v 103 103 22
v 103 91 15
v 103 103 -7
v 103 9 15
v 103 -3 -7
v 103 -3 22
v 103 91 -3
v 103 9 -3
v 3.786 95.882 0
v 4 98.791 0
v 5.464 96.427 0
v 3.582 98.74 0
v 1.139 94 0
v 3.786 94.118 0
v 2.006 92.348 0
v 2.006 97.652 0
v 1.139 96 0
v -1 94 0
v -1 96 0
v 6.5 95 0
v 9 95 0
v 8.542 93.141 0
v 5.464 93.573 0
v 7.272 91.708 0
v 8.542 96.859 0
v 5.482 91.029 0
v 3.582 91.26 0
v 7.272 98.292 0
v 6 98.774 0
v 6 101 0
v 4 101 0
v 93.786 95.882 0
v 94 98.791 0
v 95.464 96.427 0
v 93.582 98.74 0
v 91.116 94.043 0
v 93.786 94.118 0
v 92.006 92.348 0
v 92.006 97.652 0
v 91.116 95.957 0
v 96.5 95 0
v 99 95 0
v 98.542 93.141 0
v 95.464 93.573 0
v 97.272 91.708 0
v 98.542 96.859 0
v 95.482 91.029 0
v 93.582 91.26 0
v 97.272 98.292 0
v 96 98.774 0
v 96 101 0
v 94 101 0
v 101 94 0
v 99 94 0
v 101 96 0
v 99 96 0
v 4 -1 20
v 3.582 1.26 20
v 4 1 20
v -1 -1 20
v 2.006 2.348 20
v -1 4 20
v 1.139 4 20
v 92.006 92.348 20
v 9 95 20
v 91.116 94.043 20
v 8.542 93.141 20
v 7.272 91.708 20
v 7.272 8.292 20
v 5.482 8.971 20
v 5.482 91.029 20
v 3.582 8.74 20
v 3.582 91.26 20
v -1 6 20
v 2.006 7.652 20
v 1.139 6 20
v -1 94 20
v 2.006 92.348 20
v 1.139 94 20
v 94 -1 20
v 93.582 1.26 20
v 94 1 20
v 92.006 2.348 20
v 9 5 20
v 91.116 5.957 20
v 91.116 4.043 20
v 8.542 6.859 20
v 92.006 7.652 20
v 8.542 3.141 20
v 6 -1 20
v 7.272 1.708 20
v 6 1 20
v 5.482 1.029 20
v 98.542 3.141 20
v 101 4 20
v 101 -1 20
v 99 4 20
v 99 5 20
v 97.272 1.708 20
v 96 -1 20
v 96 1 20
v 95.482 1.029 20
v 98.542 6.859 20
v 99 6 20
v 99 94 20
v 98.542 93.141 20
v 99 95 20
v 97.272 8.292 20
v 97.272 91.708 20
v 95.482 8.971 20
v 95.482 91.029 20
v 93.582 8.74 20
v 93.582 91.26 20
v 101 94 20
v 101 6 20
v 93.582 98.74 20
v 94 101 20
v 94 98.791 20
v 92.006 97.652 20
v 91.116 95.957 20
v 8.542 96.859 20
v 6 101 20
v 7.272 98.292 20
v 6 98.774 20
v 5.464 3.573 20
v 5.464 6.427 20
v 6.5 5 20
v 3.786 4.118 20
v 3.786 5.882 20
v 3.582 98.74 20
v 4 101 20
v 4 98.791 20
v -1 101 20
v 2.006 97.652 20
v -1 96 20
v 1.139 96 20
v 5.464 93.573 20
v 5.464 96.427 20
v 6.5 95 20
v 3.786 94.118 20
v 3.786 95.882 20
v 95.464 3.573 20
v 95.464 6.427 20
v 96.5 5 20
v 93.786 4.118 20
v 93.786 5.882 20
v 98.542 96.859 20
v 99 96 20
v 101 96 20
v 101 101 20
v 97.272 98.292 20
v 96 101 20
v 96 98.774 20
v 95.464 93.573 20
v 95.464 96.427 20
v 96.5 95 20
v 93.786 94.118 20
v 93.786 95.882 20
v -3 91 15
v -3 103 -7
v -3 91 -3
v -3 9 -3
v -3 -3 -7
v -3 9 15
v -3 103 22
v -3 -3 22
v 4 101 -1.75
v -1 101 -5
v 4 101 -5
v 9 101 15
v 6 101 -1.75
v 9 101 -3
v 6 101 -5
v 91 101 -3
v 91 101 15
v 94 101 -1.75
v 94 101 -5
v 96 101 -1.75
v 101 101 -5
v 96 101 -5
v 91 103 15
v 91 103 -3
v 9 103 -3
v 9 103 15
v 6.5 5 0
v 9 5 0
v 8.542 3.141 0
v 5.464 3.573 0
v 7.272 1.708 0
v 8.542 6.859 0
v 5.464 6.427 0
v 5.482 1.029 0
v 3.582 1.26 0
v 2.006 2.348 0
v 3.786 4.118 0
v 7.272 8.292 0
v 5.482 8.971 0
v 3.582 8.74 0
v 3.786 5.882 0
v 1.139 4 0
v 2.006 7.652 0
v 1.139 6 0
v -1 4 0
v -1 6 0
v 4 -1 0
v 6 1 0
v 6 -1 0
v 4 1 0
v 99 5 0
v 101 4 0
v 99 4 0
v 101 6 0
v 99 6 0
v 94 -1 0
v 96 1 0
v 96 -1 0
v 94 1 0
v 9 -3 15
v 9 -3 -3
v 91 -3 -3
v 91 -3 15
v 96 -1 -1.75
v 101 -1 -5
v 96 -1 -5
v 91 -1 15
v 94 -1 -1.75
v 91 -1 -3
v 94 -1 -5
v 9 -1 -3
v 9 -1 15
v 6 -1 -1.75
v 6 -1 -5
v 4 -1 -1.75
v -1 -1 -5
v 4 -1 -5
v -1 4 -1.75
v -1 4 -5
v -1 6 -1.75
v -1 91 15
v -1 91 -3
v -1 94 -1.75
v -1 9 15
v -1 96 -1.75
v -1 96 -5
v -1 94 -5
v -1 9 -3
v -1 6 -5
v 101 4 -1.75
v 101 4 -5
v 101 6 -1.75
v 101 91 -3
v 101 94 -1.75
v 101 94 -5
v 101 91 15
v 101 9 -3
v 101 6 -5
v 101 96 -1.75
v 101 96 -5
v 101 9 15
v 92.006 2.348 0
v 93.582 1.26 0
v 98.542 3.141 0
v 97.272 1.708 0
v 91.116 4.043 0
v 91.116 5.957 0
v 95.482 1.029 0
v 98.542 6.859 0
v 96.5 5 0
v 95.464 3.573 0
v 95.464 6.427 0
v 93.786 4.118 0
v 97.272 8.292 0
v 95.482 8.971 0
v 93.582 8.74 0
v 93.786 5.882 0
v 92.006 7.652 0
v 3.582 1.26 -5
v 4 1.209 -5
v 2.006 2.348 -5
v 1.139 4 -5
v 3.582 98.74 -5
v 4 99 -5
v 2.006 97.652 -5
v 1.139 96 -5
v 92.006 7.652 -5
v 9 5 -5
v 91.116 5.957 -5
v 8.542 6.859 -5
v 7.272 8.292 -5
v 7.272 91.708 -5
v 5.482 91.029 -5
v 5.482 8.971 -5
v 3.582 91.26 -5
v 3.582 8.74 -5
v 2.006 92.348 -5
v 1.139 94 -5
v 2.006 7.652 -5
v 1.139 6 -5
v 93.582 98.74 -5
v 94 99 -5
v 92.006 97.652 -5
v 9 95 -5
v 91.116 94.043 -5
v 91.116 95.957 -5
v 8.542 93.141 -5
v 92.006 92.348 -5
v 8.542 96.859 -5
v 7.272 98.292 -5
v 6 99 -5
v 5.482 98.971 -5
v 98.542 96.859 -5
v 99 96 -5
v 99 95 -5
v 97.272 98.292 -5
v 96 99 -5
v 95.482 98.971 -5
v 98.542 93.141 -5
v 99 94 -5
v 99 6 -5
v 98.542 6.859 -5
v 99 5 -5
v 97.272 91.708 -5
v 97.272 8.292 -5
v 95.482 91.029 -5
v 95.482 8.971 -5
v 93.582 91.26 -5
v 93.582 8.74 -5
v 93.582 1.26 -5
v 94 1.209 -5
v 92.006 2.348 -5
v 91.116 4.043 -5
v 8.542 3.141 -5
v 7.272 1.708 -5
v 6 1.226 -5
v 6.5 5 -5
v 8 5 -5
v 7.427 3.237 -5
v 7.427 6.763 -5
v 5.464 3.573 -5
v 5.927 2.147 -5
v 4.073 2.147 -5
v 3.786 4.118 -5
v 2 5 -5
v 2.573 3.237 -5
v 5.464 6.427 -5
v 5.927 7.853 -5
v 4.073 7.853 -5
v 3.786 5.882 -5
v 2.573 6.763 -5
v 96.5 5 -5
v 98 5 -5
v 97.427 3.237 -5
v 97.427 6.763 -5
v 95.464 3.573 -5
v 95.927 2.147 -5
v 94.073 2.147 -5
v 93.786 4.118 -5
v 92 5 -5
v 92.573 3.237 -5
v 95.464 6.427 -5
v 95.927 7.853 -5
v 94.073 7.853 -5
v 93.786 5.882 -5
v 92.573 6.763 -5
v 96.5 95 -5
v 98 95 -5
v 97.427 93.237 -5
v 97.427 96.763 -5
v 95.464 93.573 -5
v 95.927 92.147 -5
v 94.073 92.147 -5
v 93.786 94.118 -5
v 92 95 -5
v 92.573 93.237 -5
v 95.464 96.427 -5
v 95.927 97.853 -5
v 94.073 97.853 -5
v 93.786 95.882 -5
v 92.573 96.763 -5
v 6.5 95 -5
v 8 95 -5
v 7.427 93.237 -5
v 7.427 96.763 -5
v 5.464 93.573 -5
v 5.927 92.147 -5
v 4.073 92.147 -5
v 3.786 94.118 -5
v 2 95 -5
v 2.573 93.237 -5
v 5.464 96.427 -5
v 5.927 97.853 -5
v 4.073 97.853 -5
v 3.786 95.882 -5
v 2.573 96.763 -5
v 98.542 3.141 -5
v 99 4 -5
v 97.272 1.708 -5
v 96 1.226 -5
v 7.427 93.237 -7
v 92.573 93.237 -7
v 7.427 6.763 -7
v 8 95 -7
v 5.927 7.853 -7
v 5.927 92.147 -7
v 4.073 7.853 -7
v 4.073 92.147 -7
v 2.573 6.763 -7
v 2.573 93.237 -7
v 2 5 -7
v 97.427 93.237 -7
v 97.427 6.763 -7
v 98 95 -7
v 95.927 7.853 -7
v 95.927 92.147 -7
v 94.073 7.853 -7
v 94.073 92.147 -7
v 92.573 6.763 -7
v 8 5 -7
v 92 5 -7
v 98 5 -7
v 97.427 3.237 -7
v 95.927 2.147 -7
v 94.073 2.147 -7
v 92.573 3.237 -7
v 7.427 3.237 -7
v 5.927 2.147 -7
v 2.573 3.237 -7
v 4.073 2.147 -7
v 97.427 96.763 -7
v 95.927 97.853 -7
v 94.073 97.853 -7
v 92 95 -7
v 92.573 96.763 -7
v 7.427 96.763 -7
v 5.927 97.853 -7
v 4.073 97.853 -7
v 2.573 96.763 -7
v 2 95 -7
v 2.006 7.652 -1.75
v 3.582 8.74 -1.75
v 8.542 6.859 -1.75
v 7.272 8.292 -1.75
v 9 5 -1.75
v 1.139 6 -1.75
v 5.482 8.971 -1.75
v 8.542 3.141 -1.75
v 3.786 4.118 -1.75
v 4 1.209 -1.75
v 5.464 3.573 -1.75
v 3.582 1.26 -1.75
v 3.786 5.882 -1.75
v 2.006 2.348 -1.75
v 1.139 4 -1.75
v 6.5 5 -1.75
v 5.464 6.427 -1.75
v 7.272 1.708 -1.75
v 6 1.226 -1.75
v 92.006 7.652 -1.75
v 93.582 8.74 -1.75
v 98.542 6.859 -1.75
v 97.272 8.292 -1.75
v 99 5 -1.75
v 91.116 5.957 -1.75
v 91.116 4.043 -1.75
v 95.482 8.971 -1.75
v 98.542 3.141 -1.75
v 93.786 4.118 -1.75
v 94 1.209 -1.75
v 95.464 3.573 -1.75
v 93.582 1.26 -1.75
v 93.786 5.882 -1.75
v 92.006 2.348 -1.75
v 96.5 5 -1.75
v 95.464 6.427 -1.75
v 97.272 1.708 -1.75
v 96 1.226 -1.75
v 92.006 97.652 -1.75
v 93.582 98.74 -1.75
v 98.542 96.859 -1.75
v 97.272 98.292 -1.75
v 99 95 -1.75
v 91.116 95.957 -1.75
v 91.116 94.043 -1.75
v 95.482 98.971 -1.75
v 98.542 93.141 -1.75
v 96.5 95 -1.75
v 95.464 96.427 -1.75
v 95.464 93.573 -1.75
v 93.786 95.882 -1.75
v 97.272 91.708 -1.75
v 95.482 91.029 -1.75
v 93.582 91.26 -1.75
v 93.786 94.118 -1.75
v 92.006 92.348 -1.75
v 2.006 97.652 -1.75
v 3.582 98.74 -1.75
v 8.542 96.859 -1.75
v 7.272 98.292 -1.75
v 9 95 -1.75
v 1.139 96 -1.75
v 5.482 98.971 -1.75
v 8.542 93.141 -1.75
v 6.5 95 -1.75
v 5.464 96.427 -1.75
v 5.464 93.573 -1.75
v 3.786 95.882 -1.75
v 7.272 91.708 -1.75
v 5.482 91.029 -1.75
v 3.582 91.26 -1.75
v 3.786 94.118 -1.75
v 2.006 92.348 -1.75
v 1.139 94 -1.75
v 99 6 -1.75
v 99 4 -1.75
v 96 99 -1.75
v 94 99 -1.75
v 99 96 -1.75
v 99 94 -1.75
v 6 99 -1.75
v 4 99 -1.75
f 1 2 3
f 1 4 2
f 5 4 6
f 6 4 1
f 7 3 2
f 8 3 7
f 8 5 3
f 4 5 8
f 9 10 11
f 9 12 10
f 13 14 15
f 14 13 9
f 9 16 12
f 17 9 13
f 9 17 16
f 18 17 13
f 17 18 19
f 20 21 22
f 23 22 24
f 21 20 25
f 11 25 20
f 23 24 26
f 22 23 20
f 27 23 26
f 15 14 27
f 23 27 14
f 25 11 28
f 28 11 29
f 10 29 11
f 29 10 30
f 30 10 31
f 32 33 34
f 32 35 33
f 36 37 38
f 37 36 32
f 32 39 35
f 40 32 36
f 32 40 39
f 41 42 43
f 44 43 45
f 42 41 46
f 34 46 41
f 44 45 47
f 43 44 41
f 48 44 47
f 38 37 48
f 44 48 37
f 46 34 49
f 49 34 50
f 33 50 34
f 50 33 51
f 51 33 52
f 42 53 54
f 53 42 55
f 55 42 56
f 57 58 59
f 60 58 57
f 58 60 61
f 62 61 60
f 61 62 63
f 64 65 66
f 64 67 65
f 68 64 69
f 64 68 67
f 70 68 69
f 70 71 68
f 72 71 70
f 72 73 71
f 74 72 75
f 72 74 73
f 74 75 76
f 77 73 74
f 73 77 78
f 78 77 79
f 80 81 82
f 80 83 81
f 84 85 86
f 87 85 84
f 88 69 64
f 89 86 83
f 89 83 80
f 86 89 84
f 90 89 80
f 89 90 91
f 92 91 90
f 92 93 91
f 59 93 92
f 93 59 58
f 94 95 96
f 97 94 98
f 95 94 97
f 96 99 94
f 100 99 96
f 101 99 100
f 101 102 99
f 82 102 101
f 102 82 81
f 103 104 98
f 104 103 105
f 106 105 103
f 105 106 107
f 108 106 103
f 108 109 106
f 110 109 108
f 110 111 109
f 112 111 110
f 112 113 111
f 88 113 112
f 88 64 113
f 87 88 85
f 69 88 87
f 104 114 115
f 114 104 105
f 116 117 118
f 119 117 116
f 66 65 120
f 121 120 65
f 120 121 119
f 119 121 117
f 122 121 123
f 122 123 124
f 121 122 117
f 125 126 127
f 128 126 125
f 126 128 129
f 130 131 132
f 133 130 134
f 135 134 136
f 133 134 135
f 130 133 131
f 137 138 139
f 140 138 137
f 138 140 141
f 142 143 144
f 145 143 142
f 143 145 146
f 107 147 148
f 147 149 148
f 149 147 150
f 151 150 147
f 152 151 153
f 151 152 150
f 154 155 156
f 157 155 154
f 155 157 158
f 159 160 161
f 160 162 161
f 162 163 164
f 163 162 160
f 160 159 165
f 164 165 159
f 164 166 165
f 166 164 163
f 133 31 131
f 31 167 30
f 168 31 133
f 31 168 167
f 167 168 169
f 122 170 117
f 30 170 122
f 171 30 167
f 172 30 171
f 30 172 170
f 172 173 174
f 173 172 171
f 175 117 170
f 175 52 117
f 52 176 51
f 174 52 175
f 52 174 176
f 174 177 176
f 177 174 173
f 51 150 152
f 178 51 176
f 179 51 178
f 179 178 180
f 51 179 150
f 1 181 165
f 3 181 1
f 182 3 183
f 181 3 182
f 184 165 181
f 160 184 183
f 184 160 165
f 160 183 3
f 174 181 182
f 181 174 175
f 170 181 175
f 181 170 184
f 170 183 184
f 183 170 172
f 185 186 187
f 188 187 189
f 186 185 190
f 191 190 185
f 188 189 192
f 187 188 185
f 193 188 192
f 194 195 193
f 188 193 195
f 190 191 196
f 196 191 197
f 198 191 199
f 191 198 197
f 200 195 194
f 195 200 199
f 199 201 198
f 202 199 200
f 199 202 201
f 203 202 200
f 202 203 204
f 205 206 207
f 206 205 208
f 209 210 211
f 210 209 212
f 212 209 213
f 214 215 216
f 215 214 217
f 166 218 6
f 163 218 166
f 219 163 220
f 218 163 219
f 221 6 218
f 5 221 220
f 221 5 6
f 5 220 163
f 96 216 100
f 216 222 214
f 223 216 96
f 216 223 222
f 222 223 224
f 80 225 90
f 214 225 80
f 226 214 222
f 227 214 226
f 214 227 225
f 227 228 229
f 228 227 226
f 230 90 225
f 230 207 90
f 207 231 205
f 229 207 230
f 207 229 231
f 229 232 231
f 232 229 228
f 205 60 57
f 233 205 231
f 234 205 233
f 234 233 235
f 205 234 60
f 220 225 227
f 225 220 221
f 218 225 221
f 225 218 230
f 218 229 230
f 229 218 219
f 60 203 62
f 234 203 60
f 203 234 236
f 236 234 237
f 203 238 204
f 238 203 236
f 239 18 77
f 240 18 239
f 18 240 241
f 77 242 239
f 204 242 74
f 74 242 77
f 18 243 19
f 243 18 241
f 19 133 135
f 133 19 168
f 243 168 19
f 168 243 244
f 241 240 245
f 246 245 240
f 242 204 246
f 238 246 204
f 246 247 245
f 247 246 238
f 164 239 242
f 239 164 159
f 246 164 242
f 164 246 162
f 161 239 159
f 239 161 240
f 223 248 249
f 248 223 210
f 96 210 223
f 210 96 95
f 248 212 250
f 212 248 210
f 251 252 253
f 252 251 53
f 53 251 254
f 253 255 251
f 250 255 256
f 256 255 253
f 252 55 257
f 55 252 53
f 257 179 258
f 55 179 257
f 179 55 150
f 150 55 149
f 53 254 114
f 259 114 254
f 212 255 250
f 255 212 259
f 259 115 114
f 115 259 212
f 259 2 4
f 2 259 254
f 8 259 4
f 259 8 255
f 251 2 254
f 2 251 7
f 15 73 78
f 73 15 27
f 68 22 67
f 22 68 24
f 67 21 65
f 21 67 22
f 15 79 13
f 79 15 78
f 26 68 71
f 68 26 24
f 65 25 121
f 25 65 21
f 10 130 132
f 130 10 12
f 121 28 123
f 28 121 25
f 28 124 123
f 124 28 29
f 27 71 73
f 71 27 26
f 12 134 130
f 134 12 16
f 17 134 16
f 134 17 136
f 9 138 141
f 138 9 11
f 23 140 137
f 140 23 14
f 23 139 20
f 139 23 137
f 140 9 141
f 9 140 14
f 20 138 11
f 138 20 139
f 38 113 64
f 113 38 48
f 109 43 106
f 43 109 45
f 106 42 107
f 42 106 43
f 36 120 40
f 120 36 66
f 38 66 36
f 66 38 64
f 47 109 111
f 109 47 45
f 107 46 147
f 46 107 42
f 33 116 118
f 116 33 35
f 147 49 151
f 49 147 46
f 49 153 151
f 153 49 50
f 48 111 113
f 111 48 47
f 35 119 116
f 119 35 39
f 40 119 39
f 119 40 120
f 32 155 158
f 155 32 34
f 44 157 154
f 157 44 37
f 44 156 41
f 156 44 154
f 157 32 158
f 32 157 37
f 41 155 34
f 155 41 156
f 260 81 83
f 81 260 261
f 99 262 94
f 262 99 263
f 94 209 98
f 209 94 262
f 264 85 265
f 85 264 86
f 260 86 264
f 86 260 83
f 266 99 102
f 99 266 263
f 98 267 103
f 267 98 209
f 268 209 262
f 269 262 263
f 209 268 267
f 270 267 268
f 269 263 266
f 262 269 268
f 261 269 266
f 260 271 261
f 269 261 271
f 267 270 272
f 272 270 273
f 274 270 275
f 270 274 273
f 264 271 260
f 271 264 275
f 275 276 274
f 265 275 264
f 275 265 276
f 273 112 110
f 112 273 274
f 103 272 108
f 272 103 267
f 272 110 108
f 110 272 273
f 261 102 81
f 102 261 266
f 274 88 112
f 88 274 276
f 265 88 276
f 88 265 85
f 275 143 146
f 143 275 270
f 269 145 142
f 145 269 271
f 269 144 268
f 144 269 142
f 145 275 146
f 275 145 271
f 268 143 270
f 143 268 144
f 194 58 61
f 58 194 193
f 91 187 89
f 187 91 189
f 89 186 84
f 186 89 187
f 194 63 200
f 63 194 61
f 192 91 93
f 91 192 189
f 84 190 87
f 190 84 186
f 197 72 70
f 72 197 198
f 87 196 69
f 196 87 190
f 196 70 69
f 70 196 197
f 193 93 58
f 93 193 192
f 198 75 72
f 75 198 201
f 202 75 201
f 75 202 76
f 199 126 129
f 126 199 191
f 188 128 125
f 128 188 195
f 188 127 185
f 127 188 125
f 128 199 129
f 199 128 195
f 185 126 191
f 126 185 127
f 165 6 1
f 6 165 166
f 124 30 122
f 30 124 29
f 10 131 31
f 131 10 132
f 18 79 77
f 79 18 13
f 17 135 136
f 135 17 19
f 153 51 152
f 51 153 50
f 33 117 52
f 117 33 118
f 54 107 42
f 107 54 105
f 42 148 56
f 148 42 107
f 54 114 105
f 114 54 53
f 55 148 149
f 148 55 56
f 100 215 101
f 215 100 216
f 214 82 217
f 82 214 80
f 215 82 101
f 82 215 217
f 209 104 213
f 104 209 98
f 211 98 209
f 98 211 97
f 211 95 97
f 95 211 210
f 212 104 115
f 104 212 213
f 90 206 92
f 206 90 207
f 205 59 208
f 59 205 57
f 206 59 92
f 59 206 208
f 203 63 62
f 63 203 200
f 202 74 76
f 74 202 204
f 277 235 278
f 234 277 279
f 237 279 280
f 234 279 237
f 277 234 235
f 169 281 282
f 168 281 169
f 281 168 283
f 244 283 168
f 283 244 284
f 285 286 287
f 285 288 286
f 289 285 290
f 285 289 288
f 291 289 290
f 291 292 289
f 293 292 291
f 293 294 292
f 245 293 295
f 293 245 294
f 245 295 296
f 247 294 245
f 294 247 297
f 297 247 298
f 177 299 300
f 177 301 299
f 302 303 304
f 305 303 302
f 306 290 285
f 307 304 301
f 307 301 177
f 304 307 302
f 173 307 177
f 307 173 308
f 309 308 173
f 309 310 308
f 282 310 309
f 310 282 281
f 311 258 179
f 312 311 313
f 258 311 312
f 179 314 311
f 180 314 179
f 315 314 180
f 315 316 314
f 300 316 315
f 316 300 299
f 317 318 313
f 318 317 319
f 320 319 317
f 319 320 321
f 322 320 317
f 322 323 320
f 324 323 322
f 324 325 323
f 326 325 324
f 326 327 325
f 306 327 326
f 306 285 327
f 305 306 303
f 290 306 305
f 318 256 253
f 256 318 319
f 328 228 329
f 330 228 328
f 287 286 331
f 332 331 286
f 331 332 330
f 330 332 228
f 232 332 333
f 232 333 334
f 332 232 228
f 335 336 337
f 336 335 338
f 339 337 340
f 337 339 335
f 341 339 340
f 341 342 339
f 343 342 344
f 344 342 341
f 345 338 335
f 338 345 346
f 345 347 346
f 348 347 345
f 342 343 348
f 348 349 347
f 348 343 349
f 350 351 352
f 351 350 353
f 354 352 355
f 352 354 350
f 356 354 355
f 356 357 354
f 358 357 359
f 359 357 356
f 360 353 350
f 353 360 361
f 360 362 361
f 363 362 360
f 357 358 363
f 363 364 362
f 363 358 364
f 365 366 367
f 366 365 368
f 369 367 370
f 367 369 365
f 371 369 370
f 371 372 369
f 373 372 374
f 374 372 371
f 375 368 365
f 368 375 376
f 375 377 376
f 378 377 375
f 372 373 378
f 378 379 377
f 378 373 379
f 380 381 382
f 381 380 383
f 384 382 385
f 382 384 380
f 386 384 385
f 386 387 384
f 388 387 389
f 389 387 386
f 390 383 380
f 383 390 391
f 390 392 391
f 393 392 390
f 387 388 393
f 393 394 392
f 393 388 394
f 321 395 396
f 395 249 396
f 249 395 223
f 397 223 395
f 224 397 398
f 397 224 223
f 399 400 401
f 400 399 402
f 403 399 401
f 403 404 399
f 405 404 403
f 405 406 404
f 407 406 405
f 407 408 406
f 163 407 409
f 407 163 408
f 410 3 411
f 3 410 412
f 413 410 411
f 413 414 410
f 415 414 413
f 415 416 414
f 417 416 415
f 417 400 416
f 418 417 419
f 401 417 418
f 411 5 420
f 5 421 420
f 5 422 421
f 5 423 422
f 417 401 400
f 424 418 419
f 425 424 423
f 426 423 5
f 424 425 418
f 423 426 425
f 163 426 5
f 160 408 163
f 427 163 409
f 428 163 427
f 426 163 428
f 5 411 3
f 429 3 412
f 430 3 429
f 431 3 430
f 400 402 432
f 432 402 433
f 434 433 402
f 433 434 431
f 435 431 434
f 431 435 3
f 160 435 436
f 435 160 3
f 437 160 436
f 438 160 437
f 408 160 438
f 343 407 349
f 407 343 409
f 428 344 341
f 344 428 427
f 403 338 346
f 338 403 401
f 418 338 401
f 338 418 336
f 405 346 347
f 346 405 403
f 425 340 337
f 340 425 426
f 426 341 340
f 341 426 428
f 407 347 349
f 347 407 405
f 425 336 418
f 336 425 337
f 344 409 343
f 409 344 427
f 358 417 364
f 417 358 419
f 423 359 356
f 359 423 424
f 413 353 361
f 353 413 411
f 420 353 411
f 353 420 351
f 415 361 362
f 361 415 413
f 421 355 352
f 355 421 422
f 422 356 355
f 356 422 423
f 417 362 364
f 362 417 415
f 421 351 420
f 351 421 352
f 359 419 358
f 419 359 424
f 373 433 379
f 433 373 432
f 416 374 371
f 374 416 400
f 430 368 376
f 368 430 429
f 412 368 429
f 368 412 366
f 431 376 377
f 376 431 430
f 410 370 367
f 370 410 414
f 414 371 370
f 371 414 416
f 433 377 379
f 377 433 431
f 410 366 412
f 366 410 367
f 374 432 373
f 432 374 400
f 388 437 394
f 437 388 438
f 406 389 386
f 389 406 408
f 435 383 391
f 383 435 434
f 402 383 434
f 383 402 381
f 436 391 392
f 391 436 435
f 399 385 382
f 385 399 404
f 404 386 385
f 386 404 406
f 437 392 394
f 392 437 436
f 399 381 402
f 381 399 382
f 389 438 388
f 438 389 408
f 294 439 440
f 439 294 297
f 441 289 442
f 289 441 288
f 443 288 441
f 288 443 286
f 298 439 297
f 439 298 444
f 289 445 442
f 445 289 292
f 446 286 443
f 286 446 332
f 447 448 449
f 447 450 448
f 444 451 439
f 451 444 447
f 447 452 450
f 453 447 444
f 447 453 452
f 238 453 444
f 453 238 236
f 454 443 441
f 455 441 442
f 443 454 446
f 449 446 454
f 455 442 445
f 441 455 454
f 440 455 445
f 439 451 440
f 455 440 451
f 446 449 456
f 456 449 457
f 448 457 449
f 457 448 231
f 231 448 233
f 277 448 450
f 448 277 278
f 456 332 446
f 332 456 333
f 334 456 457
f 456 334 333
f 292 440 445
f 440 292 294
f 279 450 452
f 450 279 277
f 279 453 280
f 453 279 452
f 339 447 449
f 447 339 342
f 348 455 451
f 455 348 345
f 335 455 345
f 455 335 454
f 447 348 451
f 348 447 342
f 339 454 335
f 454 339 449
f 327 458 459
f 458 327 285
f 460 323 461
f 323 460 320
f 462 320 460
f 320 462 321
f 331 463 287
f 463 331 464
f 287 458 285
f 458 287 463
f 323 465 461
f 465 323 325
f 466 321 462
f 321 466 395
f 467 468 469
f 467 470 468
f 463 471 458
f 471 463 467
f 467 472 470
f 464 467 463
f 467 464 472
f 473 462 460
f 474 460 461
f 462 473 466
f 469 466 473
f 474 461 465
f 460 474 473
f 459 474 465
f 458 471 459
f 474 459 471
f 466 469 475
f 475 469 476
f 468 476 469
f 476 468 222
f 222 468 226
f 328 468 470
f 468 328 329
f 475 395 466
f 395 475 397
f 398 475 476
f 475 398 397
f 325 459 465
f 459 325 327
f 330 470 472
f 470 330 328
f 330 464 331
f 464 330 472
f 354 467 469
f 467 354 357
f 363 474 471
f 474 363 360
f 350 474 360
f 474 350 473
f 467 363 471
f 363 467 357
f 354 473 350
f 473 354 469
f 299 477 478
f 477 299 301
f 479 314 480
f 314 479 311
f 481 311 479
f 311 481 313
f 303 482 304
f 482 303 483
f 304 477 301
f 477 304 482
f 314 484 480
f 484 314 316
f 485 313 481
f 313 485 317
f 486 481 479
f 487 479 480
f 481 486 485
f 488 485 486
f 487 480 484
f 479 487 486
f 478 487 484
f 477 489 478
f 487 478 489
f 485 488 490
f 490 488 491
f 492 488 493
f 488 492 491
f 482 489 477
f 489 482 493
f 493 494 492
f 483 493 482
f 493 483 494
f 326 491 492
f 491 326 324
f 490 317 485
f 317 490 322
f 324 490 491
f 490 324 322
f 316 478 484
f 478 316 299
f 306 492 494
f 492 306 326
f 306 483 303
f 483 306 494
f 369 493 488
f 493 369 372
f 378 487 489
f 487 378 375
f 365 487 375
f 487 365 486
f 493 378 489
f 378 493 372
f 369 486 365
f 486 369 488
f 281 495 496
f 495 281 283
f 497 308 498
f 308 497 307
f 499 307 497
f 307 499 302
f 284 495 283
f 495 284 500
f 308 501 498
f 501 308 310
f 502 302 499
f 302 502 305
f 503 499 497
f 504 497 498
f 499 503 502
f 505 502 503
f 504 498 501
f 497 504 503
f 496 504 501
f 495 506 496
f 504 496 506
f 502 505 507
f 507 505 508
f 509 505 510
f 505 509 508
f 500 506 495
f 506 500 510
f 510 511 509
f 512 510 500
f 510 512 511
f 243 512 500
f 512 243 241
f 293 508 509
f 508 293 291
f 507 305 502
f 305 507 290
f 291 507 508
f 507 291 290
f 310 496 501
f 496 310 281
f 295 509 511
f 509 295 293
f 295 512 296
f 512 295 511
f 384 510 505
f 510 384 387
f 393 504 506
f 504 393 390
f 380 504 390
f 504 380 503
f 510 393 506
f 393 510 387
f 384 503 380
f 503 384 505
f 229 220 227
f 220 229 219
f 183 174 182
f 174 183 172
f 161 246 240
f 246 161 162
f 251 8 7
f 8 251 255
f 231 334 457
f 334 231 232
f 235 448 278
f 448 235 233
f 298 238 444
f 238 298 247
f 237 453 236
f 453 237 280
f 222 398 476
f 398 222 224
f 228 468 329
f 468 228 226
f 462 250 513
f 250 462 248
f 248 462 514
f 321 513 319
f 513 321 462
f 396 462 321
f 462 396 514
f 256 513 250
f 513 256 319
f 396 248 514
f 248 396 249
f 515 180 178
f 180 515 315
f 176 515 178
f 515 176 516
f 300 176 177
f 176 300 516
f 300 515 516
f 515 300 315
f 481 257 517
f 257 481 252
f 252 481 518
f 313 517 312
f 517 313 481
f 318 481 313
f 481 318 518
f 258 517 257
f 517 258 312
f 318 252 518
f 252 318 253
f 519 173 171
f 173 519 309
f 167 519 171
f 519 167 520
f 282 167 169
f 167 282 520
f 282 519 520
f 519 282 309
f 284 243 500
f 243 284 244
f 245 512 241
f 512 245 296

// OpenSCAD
// Both together, just for visuals

//color("#808080") {
shift = 0;



// beginning of top half
rotate([180,0,0]) {
translate([0,-100,-20]) {
    
// top
translate([-3, -3, -2]) {
    difference() {
        cube([106, 106, 2], center = false);
        
    }
}

// back
translate([-3, -3, 0]) {
    difference() {
        cube([106, 2, 20], center = false);
        translate([3+9, -1, 5]) {
            cube([82, 4, 16], center = false);
        }
    }
}

// front
translate([-3, 101, 0]) {
    difference() {
        cube([106, 2, 20], center = false);
        translate([3+9, -1, 5]) {
            cube([82, 4, 16], center = false);
        }
    }
}

// right
translate([-3, -3, 0]) {
    difference() {
        cube([2, 106, 20], center = false);
        translate([-1, 3+9, 5]) {
            cube([4, 82, 16], center = false);
        }
    }
}

// left
translate([101, -3, 0]) {
    difference() {
        cube([2, 106, 20], center = false);
        translate([-1, 3+9, 5]) {
            cube([4, 82, 16], center = false);
        }
    }
}

// corner
translate([5, 5, 0]) {
    difference() {
        cylinder(20, 4, 4);
        translate([0, 0, -1]) {
            cylinder(21.25, 1.5, 1.5);
        }
    }
}
translate([4, -1, 0]) {
    cube([2, 3, 20], center = false);
}
translate([-1, 4, 0]) {
    cube([3, 2, 20], center = false);
}

// corner
translate([95, 5, 0]) {
    difference() {
        cylinder(20, 4, 4);
        translate([0, 0, -1]) {
            cylinder(21.25, 1.5, 1.5);
        }
    }
}
translate([94, -1, 0]) {
    cube([2, 3, 20], center = false);
}
translate([99, 4, 0]) {
    cube([3, 2, 20], center = false);
}

// corner
translate([95, 95, 0]) {
    difference() {
        cylinder(20, 4, 4);
        translate([0, 0, -1]) {
            cylinder(21.25, 1.5, 1.5);
        }
    }
}
translate([94, 99, 0]) {
    cube([2, 3, 20], center = false);
}
translate([99, 94, 0]) {
    cube([3, 2, 20], center = false);
}

// corner
translate([5, 95, 0]) {
    difference() {
        cylinder(20, 4, 4);
        translate([0, 0, -1]) {
            cylinder(21.25, 1.5, 1.5);
        }
    }
}
translate([4, 99, 0]) {
    cube([2, 3, 20], center = false);
}
translate([-1, 94, 0]) {
    cube([3, 2, 20], center = false);
}
     
// bottom
translate([-3, -3, -2]) {
    difference() {
        cube([106, 106, 2], center = false);
        translate([3+5, 3+5, -1]) {
            cylinder(4, 3, 3);
        }
        translate([3+95, 3+5, -1]) {
            cylinder(4, 3, 3);
        }
        translate([3+95, 3+95, -1]) {
            cylinder(4, 3, 3);
        }
        translate([3+5, 3+95, -1]) {
            cylinder(4, 3, 3);
        }
    }
}

// front left corner
translate([5, 5, 0]) {
    difference() {
        cylinder(3.25, 4, 4);
        translate([0, 0, -1]) {
            cylinder(4.5, 1.5, 1.5);
        }
    }
}
translate([4, -1, 0]) {
    cube([2, 3, 3.25], center = false);
}
translate([-1, 4, 0]) {
    cube([3, 2, 3.25], center = false);
}

// front right corner
translate([95, 5, 0]) {
    difference() {
        cylinder(3.25, 4, 4);
        translate([0, 0, -1]) {
            cylinder(4.5, 1.5, 1.5);
        }
    }
}
translate([94, -1, 0]) {
    cube([2, 3, 3.25], center = false);
}
translate([99, 4, 0]) {
    cube([3, 2, 3.25], center = false);
}

// back right corner
translate([95, 95, 0]) {
    difference() {
        cylinder(3.25, 4, 4);
        translate([0, 0, -1]) {
            cylinder(4.5, 1.5, 1.5);
        }
    }
}
translate([94, 99, 0]) {
    cube([2, 3, 3.25], center = false);
}
translate([99, 94, 0]) {
    cube([3, 2, 3.25], center = false);
}

// back left corner
translate([5, 95, 0]) {
    difference() {
        cylinder(3.25, 4, 4);
        translate([0, 0, -1]) {
            cylinder(4.5, 1.5, 1.5);
        }
    }
}
translate([4, 99, 0]) {
    cube([2, 3, 3.25], center = false);
}
translate([-1, 94, 0]) {
    cube([3, 2, 3.25], center = false);
} 

translate([4, 99, 0]) {
    cube([2, 3, 20], center = false);
}
translate([-1, 94, 0]) {
    cube([3, 2, 20], center = false);
}
}}
// end of top half



// beginning of bottom half
translate([0,0,-5]) {

// bottom
translate([-3, -3, -2]) {
    difference() {
        cube([106, 106, 2], center = false);
        translate([3+5, 3+5, -1]) {
            cylinder(4, 3, 3);
        }
        translate([3+95, 3+5, -1]) {
            cylinder(4, 3, 3);
        }
        translate([3+95, 3+95, -1]) {
            cylinder(4, 3, 3);
        }
        translate([3+5, 3+95, -1]) {
            cylinder(4, 3, 3);
        }
    }
}

// front
translate([-3, -3, 0]) {
    difference() {
        cube([106, 2, 5], center = false);
        translate([12, -5, 2]) {
            cube([82, 10, 4], center = false);
        }
    }
}

// back
translate([-3, 101, 0]) {
    difference() {
        cube([106, 2, 5], center = false);
        translate([12, -5, 2]) {
            cube([82, 10, 4], center = false);
        }
    }
}

// left
translate([-3, -3, 0]) {
    difference() {
        cube([2, 106, 5], center = false);
        translate([-5, 12, 2]) {
            cube([10, 82, 4], center = false);
        }
    }
}

// right
translate([101, -3, 0]) {
    difference() {
        cube([2, 106, 5], center = false);
        translate([-5, 12, 2]) {
            cube([10, 82, 4], center = false);
        }
    }
}

// front left corner
translate([5, 5, 0]) {
    difference() {
        cylinder(3.25, 4, 4);
        translate([0, 0, -1]) {
            cylinder(4.5, 1.5, 1.5);
        }
    }
}
translate([4, -1, 0]) {
    cube([2, 3, 3.25], center = false);
}
translate([-1, 4, 0]) {
    cube([3, 2, 3.25], center = false);
}

// front right corner
translate([95, 5, 0]) {
    difference() {
        cylinder(3.25, 4, 4);
        translate([0, 0, -1]) {
            cylinder(4.5, 1.5, 1.5);
        }
    }
}
translate([94, -1, 0]) {
    cube([2, 3, 3.25], center = false);
}
translate([99, 4, 0]) {
    cube([3, 2, 3.25], center = false);
}

// back right corner
translate([95, 95, 0]) {
    difference() {
        cylinder(3.25, 4, 4);
        translate([0, 0, -1]) {
            cylinder(4.5, 1.5, 1.5);
        }
    }
}
translate([94, 99, 0]) {
    cube([2, 3, 3.25], center = false);
}
translate([99, 94, 0]) {
    cube([3, 2, 3.25], center = false);
}

// back left corner
translate([5, 95, 0]) {
    difference() {
        cylinder(3.25, 4, 4);
        translate([0, 0, -1]) {
            cylinder(4.5, 1.5, 1.5);
        }
    }
}
translate([4, 99, 0]) {
    cube([2, 3, 3.25], center = false);
}
translate([-1, 94, 0]) {
    cube([3, 2, 3.25], center = false);
}
}
// end of bottom half
